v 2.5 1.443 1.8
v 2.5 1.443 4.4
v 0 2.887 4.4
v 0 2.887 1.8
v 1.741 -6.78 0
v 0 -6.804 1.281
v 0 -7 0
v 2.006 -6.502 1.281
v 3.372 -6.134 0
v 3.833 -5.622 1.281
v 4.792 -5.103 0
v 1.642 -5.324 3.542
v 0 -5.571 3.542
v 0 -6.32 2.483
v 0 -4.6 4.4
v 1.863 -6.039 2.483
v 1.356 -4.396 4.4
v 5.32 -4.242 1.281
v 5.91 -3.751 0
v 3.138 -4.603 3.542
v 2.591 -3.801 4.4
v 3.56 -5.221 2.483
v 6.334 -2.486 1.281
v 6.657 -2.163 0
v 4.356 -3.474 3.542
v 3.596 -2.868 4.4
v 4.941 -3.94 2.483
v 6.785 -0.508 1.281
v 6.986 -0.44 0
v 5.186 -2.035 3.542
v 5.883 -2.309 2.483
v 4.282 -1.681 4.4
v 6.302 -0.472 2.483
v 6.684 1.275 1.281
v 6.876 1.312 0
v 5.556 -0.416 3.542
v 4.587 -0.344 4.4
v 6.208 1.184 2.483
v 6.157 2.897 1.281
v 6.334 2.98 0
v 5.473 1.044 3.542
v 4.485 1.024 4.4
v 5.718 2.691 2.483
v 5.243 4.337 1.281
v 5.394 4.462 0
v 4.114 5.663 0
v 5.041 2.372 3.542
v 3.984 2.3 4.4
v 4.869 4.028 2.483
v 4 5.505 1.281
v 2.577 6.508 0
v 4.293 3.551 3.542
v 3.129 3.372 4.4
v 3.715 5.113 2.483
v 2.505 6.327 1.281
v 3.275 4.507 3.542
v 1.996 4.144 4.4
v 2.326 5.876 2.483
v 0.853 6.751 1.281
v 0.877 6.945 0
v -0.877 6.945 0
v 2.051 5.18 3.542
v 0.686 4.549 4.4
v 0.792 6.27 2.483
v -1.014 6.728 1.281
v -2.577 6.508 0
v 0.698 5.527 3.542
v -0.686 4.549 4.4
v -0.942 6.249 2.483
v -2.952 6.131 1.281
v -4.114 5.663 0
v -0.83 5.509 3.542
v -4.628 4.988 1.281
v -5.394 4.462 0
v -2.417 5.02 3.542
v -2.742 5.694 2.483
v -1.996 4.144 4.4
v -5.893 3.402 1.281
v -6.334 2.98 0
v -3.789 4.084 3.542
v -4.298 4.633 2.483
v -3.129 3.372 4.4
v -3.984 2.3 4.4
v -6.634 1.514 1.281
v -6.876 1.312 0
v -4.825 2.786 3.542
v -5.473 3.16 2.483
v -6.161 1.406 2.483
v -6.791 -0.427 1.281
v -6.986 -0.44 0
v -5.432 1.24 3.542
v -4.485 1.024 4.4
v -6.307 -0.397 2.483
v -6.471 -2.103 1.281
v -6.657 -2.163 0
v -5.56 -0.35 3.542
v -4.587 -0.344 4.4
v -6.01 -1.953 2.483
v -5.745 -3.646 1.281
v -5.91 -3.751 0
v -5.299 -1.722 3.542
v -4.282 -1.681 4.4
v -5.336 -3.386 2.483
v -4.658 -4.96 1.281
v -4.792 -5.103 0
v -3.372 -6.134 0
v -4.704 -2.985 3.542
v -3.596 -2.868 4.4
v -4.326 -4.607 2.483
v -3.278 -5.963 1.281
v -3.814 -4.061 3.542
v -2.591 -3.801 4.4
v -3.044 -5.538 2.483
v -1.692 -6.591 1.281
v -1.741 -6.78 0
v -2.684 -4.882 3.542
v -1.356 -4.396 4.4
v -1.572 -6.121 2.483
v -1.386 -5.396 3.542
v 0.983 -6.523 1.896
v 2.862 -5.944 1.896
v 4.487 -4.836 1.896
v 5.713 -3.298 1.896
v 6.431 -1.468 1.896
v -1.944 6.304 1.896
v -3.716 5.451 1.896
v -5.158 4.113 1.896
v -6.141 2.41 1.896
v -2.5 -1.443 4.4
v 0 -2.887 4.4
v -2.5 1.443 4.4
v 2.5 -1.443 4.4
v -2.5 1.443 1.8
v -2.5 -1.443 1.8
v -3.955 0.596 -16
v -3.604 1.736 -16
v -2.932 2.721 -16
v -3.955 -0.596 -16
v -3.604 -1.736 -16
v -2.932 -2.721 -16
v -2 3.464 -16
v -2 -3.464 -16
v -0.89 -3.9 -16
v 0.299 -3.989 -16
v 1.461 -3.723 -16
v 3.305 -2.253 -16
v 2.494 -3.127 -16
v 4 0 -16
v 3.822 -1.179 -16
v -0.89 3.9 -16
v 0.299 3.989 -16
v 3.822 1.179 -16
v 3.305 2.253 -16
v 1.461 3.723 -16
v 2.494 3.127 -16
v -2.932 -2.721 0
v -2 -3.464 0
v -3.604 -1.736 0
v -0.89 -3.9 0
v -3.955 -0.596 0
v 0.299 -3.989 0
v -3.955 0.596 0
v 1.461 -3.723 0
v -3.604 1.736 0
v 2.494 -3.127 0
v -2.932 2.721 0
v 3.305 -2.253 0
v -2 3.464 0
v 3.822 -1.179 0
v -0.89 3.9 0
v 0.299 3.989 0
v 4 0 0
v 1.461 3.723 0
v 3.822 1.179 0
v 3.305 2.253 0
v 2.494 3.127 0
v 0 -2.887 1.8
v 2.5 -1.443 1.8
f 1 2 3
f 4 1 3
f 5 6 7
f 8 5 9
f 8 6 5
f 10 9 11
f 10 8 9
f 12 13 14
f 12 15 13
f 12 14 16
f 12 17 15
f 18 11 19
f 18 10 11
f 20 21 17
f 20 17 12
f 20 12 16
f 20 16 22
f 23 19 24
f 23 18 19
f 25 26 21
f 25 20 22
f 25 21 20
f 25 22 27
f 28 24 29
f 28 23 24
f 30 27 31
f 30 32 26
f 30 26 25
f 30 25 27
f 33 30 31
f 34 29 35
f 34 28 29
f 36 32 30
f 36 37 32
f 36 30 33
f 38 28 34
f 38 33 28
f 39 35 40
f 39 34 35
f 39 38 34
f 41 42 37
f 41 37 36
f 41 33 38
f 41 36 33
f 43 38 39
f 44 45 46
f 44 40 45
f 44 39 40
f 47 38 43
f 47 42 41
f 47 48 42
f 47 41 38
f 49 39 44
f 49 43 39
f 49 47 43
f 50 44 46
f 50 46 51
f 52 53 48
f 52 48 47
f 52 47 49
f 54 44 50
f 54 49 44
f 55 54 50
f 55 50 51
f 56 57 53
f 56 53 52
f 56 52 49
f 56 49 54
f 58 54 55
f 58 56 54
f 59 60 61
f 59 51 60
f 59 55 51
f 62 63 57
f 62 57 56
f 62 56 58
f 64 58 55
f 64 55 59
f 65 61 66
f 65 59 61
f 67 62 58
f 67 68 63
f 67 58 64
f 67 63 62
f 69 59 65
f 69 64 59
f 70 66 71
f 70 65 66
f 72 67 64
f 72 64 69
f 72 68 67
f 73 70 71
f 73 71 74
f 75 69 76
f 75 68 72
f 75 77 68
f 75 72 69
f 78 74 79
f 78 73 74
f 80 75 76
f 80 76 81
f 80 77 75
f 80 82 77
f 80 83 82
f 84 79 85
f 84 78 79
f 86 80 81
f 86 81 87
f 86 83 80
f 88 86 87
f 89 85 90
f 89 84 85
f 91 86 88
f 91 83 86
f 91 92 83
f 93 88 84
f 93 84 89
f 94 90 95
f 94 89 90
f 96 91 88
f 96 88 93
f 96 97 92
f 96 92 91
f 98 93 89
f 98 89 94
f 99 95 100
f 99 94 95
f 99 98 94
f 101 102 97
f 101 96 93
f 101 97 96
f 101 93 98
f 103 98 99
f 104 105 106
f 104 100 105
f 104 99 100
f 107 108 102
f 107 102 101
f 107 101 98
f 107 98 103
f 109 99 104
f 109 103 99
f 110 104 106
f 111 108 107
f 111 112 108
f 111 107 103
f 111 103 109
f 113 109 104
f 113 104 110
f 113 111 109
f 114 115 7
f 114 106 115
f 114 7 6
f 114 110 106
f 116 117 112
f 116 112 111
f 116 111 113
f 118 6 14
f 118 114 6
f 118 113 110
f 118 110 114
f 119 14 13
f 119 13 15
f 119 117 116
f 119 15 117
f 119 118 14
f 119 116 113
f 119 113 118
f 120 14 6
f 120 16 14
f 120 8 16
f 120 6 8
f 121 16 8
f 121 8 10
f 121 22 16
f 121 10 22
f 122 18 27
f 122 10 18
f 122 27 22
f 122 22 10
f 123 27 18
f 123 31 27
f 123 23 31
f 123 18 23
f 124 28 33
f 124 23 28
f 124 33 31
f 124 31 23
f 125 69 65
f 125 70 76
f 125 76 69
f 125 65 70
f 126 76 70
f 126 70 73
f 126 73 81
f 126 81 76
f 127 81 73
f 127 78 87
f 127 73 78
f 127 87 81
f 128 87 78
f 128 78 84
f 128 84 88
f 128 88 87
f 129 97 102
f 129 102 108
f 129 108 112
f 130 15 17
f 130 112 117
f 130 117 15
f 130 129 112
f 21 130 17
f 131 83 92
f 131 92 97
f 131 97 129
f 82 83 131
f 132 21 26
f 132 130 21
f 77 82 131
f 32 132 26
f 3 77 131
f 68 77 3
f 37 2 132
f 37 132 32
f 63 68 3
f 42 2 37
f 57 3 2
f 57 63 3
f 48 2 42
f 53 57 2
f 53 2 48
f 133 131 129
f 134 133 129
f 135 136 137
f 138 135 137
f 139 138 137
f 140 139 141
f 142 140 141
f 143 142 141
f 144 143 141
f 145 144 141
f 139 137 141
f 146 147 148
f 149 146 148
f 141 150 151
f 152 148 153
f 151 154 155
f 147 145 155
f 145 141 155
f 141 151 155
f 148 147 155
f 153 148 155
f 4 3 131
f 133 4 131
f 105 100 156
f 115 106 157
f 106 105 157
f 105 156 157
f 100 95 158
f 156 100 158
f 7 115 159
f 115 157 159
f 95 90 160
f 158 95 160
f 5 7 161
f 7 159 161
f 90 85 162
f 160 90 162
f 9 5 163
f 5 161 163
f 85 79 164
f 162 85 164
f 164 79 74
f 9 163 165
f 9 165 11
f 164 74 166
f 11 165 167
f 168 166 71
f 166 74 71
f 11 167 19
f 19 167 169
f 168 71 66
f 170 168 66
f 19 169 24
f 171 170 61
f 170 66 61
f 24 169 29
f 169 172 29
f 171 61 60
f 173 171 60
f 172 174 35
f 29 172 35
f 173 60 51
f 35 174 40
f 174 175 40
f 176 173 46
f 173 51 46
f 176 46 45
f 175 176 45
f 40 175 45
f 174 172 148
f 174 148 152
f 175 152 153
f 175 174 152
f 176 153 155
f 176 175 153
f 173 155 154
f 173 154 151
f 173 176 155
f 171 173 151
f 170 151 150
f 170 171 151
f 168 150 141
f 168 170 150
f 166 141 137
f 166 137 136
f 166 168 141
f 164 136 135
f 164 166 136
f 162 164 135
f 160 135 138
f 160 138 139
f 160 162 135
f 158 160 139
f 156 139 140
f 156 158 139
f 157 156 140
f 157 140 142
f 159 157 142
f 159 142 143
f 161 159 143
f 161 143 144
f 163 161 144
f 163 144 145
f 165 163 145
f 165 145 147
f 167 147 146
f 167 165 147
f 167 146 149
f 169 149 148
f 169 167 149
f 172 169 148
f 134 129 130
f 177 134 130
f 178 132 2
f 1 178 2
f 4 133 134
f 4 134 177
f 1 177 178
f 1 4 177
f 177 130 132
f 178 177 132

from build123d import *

# Parameters (mm, degrees)
F0_R     = 7
F1_DEPTH = 4.4
F3_DEPTH = 2.6
F6_R     = 4
F7_DEPTH = 16


with BuildPart() as f1:
    # F0 (on Top) → F1 (new body)
    with BuildSketch(Plane.XY):
        Circle(F0_R)
    extrude(amount=F1_DEPTH)

    # F2 (on face) → F3 (cut)
    with BuildSketch(Plane.XY.offset(4.4)):
        Polygon((2.5, -1.443376), (2.5, 1.443376), (0, 2.886751), (-2.5, 1.443376), (-2.5, -1.443376), (0, -2.886751), align=None)
    extrude(amount=-F3_DEPTH, mode=Mode.SUBTRACT)

    # F4 (on Right) → F5 (revolve, cut)
    with BuildSketch(Plane.YZ):
        with BuildLine():
            Line((-7, 4.4), (-7, 0))
            ThreePointArc((-7, 0), (-6.319513, 2.483371), (-4.6, 4.4))
            Line((-4.6, 4.4), (-7, 4.4))
        make_face()
    revolve(axis=Axis((0, 0, 2.2), (0, 0, 1)), mode=Mode.SUBTRACT)

    # F6 (on Top) → F7 (join)
    with BuildSketch(Plane.XY):
        Circle(F6_R)
    extrude(amount=-F7_DEPTH)


solid = f1.part
